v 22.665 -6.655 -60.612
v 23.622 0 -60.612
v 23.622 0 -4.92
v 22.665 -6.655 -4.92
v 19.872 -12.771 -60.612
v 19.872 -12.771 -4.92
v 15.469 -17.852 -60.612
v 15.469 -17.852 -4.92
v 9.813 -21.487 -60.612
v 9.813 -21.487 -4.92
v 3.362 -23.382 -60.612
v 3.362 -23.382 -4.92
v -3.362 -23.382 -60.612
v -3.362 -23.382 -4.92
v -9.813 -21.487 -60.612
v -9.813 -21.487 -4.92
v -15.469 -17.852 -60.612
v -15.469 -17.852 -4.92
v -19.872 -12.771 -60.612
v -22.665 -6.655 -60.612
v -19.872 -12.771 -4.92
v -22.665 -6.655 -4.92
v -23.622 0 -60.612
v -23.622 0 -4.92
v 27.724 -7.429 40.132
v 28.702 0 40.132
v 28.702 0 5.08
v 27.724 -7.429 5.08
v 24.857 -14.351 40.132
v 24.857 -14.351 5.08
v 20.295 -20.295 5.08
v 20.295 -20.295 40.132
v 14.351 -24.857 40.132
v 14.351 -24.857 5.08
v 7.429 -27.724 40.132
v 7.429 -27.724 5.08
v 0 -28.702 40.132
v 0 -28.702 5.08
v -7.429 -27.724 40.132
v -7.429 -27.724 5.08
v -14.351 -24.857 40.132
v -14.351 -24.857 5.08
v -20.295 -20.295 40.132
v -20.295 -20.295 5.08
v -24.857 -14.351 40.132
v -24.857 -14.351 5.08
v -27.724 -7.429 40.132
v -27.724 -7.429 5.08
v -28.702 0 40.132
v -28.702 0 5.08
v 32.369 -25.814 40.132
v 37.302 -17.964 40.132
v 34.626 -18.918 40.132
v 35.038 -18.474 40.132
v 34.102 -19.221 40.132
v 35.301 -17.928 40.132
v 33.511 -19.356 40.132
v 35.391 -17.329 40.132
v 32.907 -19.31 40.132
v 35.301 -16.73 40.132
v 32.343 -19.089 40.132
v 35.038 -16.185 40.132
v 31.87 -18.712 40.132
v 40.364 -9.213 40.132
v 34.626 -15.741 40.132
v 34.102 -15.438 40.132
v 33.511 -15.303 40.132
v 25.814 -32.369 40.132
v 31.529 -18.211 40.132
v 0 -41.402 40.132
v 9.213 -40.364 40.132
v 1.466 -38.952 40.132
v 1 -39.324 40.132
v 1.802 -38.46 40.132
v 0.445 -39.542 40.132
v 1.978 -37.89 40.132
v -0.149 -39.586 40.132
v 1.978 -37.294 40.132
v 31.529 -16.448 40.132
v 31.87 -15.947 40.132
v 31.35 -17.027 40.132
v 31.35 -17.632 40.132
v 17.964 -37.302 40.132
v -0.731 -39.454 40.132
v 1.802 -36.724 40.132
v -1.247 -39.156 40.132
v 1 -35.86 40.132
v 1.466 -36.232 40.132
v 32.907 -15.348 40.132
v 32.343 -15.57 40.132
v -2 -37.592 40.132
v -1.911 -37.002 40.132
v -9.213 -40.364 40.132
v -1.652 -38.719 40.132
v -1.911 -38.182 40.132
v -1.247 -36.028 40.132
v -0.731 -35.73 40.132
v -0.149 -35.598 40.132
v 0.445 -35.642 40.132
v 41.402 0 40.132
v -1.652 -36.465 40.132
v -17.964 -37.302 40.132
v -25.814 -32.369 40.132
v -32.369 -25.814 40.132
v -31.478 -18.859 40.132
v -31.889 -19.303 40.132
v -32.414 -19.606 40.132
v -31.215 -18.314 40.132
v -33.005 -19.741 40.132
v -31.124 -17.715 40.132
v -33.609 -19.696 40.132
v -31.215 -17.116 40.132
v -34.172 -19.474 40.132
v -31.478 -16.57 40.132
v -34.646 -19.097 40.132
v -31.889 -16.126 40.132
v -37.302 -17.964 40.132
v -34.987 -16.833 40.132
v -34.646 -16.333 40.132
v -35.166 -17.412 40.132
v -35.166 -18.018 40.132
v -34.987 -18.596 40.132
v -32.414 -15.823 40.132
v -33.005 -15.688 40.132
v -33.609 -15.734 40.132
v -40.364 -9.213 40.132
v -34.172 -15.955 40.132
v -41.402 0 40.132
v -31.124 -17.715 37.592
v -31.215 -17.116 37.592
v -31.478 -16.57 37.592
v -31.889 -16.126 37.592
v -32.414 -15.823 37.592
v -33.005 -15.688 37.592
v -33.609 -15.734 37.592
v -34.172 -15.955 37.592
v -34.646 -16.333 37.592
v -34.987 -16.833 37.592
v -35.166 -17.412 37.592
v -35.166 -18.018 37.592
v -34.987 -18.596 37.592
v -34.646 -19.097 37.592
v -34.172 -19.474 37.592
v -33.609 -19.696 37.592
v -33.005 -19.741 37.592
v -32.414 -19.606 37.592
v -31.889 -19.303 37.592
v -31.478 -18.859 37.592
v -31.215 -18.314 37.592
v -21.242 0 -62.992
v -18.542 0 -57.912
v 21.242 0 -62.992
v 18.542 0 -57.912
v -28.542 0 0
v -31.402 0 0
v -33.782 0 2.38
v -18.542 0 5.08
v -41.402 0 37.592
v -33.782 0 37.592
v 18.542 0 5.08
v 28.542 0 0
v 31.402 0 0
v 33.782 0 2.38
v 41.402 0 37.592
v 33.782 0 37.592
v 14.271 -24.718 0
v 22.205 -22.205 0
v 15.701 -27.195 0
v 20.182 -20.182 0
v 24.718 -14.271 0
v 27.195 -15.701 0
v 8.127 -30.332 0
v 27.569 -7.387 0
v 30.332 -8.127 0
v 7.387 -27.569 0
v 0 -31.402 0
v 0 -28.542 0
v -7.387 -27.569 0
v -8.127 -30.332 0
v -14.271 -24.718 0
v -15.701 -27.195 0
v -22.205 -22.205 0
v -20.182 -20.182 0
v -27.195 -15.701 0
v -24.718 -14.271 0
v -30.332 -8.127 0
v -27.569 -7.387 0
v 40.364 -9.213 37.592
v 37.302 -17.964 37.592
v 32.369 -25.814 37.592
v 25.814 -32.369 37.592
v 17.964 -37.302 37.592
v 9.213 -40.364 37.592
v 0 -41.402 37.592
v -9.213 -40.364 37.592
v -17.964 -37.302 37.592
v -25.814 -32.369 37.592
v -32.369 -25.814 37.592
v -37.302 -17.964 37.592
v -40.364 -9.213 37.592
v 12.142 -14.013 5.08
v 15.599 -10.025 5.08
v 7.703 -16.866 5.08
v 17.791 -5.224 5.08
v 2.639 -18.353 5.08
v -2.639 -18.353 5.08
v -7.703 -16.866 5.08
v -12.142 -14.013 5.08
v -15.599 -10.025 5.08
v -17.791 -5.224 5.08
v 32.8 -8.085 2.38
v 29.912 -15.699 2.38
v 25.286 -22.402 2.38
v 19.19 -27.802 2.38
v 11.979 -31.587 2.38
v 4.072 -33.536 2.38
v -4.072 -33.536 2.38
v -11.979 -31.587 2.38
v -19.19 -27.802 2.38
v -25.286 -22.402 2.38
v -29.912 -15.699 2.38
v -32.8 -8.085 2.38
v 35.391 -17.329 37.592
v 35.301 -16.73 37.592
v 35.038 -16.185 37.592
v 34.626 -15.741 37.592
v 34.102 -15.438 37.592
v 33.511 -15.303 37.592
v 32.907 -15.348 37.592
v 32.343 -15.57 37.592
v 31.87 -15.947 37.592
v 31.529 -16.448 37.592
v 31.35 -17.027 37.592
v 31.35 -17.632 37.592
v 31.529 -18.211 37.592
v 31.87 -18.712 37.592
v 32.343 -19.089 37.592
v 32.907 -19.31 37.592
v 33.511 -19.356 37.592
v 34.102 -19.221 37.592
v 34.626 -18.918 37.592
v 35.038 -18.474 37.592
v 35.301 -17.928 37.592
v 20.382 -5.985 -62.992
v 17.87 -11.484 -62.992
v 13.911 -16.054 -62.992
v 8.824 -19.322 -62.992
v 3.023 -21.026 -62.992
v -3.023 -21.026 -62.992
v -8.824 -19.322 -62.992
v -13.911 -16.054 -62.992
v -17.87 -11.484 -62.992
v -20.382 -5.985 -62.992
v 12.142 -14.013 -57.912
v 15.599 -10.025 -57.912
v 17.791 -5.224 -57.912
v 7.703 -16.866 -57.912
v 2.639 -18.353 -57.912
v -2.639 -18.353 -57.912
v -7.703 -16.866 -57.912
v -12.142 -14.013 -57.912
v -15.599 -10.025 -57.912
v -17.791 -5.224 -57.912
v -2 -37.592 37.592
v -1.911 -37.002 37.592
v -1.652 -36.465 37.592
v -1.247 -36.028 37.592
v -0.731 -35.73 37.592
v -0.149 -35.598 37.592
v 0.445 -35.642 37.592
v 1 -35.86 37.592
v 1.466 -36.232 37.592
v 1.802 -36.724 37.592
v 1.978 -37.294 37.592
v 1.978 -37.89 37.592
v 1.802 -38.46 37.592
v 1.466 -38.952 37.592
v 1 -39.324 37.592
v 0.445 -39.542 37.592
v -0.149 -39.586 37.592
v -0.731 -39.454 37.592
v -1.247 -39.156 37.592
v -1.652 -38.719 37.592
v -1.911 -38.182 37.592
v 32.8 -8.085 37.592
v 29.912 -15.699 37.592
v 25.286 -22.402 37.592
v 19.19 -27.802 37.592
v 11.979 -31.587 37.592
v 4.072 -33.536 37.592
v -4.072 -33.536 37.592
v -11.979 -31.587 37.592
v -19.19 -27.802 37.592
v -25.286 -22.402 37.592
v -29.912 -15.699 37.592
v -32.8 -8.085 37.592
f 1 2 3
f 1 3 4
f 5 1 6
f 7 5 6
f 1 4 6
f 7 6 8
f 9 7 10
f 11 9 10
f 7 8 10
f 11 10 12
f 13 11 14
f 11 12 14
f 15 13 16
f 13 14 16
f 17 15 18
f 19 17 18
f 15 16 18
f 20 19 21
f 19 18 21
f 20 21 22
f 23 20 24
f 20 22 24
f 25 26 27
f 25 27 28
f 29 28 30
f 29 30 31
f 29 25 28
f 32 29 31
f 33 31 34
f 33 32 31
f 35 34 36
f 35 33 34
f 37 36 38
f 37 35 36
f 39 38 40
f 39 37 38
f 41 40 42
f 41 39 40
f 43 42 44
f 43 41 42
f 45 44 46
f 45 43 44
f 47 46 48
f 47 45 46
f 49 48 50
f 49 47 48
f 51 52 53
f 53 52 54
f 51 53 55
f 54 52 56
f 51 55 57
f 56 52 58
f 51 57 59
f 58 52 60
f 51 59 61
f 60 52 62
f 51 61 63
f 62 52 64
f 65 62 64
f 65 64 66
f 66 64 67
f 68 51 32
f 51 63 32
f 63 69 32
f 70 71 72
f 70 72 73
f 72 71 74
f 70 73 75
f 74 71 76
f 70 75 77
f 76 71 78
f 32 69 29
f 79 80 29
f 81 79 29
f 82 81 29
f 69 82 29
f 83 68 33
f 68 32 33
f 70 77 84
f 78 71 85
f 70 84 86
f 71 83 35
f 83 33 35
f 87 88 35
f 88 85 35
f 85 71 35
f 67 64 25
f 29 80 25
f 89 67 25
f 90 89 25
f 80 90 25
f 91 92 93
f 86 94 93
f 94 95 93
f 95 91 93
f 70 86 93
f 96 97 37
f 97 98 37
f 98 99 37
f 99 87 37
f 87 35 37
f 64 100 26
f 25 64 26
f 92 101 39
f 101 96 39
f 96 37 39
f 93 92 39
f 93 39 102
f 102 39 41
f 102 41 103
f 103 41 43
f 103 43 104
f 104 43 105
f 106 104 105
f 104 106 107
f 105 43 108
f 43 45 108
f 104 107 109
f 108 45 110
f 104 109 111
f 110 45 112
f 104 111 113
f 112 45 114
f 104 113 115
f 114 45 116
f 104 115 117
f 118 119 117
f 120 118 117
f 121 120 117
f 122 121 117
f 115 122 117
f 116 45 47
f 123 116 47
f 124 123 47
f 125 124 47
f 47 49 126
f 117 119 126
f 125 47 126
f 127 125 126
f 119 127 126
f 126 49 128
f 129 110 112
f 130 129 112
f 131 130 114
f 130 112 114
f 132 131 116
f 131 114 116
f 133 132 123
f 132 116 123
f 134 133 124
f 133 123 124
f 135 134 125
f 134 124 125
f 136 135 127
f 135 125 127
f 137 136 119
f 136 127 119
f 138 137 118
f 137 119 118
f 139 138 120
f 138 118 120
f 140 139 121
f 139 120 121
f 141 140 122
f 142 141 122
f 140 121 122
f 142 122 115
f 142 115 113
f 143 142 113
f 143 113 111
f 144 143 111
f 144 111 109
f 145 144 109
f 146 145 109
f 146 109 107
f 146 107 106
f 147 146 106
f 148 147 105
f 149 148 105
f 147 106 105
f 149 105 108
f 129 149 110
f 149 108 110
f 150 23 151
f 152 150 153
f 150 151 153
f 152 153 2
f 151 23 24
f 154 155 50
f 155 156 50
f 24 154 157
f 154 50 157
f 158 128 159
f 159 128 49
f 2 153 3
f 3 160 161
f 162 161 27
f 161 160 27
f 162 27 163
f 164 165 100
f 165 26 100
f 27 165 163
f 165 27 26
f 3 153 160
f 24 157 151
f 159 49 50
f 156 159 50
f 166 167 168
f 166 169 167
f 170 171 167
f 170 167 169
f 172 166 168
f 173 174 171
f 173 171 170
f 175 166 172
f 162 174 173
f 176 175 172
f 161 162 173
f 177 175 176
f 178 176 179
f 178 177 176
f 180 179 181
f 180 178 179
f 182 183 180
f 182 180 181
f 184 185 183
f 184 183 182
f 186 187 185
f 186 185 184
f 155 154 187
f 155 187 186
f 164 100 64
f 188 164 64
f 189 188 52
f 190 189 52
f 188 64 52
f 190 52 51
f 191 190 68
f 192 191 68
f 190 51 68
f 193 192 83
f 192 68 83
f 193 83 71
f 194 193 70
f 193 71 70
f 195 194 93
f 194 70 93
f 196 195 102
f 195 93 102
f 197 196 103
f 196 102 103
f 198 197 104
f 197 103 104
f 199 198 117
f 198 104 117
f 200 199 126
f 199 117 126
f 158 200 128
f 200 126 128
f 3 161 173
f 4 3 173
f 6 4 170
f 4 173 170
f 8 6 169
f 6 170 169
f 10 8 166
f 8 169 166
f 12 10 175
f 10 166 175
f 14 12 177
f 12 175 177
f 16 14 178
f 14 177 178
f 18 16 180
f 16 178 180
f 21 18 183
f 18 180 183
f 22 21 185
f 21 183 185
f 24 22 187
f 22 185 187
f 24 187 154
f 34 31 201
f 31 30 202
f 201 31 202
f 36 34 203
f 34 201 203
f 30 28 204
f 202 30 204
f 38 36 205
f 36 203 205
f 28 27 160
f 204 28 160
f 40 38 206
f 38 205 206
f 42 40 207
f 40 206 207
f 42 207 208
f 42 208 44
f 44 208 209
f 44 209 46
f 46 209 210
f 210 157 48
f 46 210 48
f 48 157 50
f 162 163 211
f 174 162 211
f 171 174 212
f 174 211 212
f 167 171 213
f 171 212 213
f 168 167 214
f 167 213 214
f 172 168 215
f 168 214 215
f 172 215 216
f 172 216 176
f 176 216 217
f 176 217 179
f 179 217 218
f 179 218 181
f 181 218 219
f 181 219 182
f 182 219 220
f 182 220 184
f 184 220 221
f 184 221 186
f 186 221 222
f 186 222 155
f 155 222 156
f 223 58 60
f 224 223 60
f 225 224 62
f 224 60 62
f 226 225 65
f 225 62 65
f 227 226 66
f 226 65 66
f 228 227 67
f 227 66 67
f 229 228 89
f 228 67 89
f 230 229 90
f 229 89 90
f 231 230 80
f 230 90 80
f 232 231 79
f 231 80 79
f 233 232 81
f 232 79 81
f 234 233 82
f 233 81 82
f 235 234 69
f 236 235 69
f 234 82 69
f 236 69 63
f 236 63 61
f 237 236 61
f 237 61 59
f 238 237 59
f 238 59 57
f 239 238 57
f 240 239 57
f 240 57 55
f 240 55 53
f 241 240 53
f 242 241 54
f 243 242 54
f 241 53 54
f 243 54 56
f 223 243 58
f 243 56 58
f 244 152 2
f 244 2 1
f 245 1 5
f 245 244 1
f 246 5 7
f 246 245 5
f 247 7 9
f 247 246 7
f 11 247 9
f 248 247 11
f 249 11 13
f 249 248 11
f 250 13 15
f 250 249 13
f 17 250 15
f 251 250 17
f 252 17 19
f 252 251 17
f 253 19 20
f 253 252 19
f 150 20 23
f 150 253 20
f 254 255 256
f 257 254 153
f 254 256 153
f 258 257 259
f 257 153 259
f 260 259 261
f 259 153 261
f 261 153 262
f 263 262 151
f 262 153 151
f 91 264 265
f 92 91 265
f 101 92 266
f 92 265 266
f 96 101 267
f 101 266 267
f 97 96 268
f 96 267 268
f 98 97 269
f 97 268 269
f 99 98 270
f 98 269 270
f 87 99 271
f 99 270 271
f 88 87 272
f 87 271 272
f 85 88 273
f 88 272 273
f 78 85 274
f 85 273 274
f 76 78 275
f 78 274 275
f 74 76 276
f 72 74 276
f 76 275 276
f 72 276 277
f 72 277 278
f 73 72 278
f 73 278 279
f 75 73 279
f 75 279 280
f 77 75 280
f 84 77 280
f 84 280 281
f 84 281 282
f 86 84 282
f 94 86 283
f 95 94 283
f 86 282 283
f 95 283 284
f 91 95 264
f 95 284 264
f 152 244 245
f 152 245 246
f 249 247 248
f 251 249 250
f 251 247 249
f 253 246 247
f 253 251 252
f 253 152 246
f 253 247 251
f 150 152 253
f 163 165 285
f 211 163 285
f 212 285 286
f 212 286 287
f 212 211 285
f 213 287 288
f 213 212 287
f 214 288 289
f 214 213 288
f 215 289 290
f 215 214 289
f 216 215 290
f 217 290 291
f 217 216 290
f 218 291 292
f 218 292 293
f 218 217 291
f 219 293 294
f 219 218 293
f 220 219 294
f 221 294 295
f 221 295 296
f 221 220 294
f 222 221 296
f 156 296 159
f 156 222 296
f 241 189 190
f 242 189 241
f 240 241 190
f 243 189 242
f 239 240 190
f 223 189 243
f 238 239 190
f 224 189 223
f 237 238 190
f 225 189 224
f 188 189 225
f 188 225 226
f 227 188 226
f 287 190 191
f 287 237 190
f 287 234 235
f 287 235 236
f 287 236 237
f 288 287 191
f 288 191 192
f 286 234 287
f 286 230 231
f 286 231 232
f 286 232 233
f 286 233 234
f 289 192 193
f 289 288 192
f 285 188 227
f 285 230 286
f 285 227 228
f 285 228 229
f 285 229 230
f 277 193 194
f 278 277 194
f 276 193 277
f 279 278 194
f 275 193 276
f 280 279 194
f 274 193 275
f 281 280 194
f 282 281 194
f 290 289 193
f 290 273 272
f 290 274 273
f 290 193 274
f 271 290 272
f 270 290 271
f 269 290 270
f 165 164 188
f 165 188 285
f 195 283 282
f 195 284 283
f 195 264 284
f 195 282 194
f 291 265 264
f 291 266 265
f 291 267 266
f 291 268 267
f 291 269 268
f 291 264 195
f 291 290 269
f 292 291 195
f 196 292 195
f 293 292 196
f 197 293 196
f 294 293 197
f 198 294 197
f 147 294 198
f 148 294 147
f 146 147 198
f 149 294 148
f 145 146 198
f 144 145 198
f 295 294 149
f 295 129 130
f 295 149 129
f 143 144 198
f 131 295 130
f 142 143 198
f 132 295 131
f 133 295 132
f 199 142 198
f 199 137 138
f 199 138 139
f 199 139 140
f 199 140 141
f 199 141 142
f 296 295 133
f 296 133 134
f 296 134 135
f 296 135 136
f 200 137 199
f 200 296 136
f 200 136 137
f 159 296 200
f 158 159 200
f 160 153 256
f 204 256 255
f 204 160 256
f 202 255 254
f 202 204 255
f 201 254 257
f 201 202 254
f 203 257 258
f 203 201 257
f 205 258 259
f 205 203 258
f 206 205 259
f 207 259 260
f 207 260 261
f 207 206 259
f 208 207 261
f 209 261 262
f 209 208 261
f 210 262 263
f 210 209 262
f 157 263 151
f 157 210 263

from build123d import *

# Parameters (mm, degrees)
BOSS_EXTRUDE1_DEPTH = 62.992
CUT_EXTRUDE1_DEPTH  = 57.912
BOSS_EXTRUDE2_DEPTH = 40.132
CUT_EXTRUDE2_DEPTH  = 40.132
CUT_EXTRUDE3_DEPTH  = 35.052
BOSS_EXTRUDE3_DEPTH = 2.54
CUT_EXTRUDE4_DEPTH  = 2.54
CHAMFER1_SIZE       = 4.92
CHAMFER3_SIZE       = 2.38
CHAMFER4_SIZE       = 2.38
SKETCH12_R          = 2
CUT_EXTRUDE6_DEPTH  = 2.54
SKETCH16_R          = 2.032
CUT_EXTRUDE7_DEPTH  = 2.54


with BuildPart() as part:
    # Sketch2 → Boss-Extrude1 (new body)
    with BuildSketch(Plane.XY):
        with BuildLine():
            Line((-23.622, 0), (23.622, 0))
            ThreePointArc((23.622, 0), (0, -23.622), (-23.622, 0))
        make_face()
    extrude(amount=-BOSS_EXTRUDE1_DEPTH)

    # Sketch3 → Cut-Extrude1 (cut)
    with BuildSketch(Plane.XY):
        with BuildLine():
            Line((-18.542, 0), (18.542, 0))
            ThreePointArc((18.542, 0), (0, -18.542), (-18.542, 0))
        make_face()
    extrude(amount=-CUT_EXTRUDE1_DEPTH, mode=Mode.SUBTRACT)

    # Sketch5 → Boss-Extrude2 (add)
    with BuildSketch(Plane.XY):
        with BuildLine():
            Line((-33.782, 0), (33.782, 0))
            ThreePointArc((33.782, 0), (0, -33.782), (-33.782, 0))
        make_face()
    extrude(amount=BOSS_EXTRUDE2_DEPTH)

    # Sketch6 → Cut-Extrude2 (cut)
    with BuildSketch(Plane.XY.offset(40.132)):
        with BuildLine():
            Line((-18.542, 0), (18.542, 0))
            ThreePointArc((18.542, 0), (0, -18.542), (-18.542, 0))
        make_face()
    extrude(amount=-CUT_EXTRUDE2_DEPTH, mode=Mode.SUBTRACT)

    # Sketch7 → Cut-Extrude3 (cut)
    with BuildSketch(Plane.XY.offset(40.132)):
        with BuildLine():
            Line((-28.702, 0), (28.702, 0))
            ThreePointArc((28.702, 0), (0, -28.702), (-28.702, 0))
        make_face()
    extrude(amount=-CUT_EXTRUDE3_DEPTH, mode=Mode.SUBTRACT)

    # Sketch9 → Boss-Extrude3 (add)
    with BuildSketch(Plane.XY.offset(40.132)):
        with BuildLine():
            Line((-41.402, 0), (41.402, 0))
            ThreePointArc((41.402, 0), (0, -41.402), (-41.402, 0))
        make_face()
    extrude(amount=-BOSS_EXTRUDE3_DEPTH)

    # Sketch10 → Cut-Extrude4 (cut)
    with BuildSketch(Plane.XY.offset(40.132)):
        with BuildLine():
            Line((-28.702, 0), (28.702, 0))
            ThreePointArc((28.702, 0), (0, -28.702), (-28.702, 0))
        make_face()
    extrude(amount=-CUT_EXTRUDE4_DEPTH, mode=Mode.SUBTRACT)

    # Chamfer1
    chamfer1_edges = [part.edges().sort_by_distance(p)[0] for p in [
        (0, -23.622, 0),
    ]]
    chamfer(chamfer1_edges, length=CHAMFER1_SIZE)

    # Chamfer3
    chamfer3_edges = [part.edges().sort_by_distance(p)[0] for p in [
        (0, -23.622, -62.992),
    ]]
    chamfer(chamfer3_edges, length=CHAMFER3_SIZE)

    # Chamfer4
    chamfer4_edges = [part.edges().sort_by_distance(p)[0] for p in [
        (0, -33.782, 0),
    ]]
    chamfer(chamfer4_edges, length=CHAMFER4_SIZE)

    # Sketch12 → Cut-Extrude6 (cut)
    with BuildSketch(Plane(origin=(0, 0, 37.592), x_dir=(-1, 0, 0), z_dir=(0, 0, -1))):
        with Locations((0, -37.592)):
            Circle(SKETCH12_R)
    extrude(amount=-CUT_EXTRUDE6_DEPTH, mode=Mode.SUBTRACT)

    # Sketch16 → Cut-Extrude7 (cut)
    with BuildSketch(Plane.XY.offset(40.132)):
        with Locations((-33.156425447, -17.714680792)):
            Circle(SKETCH16_R)
        with Locations((33.359405316, -17.329412596)):
            Circle(SKETCH16_R)
    extrude(amount=-CUT_EXTRUDE7_DEPTH, mode=Mode.SUBTRACT)


solid = part.part
